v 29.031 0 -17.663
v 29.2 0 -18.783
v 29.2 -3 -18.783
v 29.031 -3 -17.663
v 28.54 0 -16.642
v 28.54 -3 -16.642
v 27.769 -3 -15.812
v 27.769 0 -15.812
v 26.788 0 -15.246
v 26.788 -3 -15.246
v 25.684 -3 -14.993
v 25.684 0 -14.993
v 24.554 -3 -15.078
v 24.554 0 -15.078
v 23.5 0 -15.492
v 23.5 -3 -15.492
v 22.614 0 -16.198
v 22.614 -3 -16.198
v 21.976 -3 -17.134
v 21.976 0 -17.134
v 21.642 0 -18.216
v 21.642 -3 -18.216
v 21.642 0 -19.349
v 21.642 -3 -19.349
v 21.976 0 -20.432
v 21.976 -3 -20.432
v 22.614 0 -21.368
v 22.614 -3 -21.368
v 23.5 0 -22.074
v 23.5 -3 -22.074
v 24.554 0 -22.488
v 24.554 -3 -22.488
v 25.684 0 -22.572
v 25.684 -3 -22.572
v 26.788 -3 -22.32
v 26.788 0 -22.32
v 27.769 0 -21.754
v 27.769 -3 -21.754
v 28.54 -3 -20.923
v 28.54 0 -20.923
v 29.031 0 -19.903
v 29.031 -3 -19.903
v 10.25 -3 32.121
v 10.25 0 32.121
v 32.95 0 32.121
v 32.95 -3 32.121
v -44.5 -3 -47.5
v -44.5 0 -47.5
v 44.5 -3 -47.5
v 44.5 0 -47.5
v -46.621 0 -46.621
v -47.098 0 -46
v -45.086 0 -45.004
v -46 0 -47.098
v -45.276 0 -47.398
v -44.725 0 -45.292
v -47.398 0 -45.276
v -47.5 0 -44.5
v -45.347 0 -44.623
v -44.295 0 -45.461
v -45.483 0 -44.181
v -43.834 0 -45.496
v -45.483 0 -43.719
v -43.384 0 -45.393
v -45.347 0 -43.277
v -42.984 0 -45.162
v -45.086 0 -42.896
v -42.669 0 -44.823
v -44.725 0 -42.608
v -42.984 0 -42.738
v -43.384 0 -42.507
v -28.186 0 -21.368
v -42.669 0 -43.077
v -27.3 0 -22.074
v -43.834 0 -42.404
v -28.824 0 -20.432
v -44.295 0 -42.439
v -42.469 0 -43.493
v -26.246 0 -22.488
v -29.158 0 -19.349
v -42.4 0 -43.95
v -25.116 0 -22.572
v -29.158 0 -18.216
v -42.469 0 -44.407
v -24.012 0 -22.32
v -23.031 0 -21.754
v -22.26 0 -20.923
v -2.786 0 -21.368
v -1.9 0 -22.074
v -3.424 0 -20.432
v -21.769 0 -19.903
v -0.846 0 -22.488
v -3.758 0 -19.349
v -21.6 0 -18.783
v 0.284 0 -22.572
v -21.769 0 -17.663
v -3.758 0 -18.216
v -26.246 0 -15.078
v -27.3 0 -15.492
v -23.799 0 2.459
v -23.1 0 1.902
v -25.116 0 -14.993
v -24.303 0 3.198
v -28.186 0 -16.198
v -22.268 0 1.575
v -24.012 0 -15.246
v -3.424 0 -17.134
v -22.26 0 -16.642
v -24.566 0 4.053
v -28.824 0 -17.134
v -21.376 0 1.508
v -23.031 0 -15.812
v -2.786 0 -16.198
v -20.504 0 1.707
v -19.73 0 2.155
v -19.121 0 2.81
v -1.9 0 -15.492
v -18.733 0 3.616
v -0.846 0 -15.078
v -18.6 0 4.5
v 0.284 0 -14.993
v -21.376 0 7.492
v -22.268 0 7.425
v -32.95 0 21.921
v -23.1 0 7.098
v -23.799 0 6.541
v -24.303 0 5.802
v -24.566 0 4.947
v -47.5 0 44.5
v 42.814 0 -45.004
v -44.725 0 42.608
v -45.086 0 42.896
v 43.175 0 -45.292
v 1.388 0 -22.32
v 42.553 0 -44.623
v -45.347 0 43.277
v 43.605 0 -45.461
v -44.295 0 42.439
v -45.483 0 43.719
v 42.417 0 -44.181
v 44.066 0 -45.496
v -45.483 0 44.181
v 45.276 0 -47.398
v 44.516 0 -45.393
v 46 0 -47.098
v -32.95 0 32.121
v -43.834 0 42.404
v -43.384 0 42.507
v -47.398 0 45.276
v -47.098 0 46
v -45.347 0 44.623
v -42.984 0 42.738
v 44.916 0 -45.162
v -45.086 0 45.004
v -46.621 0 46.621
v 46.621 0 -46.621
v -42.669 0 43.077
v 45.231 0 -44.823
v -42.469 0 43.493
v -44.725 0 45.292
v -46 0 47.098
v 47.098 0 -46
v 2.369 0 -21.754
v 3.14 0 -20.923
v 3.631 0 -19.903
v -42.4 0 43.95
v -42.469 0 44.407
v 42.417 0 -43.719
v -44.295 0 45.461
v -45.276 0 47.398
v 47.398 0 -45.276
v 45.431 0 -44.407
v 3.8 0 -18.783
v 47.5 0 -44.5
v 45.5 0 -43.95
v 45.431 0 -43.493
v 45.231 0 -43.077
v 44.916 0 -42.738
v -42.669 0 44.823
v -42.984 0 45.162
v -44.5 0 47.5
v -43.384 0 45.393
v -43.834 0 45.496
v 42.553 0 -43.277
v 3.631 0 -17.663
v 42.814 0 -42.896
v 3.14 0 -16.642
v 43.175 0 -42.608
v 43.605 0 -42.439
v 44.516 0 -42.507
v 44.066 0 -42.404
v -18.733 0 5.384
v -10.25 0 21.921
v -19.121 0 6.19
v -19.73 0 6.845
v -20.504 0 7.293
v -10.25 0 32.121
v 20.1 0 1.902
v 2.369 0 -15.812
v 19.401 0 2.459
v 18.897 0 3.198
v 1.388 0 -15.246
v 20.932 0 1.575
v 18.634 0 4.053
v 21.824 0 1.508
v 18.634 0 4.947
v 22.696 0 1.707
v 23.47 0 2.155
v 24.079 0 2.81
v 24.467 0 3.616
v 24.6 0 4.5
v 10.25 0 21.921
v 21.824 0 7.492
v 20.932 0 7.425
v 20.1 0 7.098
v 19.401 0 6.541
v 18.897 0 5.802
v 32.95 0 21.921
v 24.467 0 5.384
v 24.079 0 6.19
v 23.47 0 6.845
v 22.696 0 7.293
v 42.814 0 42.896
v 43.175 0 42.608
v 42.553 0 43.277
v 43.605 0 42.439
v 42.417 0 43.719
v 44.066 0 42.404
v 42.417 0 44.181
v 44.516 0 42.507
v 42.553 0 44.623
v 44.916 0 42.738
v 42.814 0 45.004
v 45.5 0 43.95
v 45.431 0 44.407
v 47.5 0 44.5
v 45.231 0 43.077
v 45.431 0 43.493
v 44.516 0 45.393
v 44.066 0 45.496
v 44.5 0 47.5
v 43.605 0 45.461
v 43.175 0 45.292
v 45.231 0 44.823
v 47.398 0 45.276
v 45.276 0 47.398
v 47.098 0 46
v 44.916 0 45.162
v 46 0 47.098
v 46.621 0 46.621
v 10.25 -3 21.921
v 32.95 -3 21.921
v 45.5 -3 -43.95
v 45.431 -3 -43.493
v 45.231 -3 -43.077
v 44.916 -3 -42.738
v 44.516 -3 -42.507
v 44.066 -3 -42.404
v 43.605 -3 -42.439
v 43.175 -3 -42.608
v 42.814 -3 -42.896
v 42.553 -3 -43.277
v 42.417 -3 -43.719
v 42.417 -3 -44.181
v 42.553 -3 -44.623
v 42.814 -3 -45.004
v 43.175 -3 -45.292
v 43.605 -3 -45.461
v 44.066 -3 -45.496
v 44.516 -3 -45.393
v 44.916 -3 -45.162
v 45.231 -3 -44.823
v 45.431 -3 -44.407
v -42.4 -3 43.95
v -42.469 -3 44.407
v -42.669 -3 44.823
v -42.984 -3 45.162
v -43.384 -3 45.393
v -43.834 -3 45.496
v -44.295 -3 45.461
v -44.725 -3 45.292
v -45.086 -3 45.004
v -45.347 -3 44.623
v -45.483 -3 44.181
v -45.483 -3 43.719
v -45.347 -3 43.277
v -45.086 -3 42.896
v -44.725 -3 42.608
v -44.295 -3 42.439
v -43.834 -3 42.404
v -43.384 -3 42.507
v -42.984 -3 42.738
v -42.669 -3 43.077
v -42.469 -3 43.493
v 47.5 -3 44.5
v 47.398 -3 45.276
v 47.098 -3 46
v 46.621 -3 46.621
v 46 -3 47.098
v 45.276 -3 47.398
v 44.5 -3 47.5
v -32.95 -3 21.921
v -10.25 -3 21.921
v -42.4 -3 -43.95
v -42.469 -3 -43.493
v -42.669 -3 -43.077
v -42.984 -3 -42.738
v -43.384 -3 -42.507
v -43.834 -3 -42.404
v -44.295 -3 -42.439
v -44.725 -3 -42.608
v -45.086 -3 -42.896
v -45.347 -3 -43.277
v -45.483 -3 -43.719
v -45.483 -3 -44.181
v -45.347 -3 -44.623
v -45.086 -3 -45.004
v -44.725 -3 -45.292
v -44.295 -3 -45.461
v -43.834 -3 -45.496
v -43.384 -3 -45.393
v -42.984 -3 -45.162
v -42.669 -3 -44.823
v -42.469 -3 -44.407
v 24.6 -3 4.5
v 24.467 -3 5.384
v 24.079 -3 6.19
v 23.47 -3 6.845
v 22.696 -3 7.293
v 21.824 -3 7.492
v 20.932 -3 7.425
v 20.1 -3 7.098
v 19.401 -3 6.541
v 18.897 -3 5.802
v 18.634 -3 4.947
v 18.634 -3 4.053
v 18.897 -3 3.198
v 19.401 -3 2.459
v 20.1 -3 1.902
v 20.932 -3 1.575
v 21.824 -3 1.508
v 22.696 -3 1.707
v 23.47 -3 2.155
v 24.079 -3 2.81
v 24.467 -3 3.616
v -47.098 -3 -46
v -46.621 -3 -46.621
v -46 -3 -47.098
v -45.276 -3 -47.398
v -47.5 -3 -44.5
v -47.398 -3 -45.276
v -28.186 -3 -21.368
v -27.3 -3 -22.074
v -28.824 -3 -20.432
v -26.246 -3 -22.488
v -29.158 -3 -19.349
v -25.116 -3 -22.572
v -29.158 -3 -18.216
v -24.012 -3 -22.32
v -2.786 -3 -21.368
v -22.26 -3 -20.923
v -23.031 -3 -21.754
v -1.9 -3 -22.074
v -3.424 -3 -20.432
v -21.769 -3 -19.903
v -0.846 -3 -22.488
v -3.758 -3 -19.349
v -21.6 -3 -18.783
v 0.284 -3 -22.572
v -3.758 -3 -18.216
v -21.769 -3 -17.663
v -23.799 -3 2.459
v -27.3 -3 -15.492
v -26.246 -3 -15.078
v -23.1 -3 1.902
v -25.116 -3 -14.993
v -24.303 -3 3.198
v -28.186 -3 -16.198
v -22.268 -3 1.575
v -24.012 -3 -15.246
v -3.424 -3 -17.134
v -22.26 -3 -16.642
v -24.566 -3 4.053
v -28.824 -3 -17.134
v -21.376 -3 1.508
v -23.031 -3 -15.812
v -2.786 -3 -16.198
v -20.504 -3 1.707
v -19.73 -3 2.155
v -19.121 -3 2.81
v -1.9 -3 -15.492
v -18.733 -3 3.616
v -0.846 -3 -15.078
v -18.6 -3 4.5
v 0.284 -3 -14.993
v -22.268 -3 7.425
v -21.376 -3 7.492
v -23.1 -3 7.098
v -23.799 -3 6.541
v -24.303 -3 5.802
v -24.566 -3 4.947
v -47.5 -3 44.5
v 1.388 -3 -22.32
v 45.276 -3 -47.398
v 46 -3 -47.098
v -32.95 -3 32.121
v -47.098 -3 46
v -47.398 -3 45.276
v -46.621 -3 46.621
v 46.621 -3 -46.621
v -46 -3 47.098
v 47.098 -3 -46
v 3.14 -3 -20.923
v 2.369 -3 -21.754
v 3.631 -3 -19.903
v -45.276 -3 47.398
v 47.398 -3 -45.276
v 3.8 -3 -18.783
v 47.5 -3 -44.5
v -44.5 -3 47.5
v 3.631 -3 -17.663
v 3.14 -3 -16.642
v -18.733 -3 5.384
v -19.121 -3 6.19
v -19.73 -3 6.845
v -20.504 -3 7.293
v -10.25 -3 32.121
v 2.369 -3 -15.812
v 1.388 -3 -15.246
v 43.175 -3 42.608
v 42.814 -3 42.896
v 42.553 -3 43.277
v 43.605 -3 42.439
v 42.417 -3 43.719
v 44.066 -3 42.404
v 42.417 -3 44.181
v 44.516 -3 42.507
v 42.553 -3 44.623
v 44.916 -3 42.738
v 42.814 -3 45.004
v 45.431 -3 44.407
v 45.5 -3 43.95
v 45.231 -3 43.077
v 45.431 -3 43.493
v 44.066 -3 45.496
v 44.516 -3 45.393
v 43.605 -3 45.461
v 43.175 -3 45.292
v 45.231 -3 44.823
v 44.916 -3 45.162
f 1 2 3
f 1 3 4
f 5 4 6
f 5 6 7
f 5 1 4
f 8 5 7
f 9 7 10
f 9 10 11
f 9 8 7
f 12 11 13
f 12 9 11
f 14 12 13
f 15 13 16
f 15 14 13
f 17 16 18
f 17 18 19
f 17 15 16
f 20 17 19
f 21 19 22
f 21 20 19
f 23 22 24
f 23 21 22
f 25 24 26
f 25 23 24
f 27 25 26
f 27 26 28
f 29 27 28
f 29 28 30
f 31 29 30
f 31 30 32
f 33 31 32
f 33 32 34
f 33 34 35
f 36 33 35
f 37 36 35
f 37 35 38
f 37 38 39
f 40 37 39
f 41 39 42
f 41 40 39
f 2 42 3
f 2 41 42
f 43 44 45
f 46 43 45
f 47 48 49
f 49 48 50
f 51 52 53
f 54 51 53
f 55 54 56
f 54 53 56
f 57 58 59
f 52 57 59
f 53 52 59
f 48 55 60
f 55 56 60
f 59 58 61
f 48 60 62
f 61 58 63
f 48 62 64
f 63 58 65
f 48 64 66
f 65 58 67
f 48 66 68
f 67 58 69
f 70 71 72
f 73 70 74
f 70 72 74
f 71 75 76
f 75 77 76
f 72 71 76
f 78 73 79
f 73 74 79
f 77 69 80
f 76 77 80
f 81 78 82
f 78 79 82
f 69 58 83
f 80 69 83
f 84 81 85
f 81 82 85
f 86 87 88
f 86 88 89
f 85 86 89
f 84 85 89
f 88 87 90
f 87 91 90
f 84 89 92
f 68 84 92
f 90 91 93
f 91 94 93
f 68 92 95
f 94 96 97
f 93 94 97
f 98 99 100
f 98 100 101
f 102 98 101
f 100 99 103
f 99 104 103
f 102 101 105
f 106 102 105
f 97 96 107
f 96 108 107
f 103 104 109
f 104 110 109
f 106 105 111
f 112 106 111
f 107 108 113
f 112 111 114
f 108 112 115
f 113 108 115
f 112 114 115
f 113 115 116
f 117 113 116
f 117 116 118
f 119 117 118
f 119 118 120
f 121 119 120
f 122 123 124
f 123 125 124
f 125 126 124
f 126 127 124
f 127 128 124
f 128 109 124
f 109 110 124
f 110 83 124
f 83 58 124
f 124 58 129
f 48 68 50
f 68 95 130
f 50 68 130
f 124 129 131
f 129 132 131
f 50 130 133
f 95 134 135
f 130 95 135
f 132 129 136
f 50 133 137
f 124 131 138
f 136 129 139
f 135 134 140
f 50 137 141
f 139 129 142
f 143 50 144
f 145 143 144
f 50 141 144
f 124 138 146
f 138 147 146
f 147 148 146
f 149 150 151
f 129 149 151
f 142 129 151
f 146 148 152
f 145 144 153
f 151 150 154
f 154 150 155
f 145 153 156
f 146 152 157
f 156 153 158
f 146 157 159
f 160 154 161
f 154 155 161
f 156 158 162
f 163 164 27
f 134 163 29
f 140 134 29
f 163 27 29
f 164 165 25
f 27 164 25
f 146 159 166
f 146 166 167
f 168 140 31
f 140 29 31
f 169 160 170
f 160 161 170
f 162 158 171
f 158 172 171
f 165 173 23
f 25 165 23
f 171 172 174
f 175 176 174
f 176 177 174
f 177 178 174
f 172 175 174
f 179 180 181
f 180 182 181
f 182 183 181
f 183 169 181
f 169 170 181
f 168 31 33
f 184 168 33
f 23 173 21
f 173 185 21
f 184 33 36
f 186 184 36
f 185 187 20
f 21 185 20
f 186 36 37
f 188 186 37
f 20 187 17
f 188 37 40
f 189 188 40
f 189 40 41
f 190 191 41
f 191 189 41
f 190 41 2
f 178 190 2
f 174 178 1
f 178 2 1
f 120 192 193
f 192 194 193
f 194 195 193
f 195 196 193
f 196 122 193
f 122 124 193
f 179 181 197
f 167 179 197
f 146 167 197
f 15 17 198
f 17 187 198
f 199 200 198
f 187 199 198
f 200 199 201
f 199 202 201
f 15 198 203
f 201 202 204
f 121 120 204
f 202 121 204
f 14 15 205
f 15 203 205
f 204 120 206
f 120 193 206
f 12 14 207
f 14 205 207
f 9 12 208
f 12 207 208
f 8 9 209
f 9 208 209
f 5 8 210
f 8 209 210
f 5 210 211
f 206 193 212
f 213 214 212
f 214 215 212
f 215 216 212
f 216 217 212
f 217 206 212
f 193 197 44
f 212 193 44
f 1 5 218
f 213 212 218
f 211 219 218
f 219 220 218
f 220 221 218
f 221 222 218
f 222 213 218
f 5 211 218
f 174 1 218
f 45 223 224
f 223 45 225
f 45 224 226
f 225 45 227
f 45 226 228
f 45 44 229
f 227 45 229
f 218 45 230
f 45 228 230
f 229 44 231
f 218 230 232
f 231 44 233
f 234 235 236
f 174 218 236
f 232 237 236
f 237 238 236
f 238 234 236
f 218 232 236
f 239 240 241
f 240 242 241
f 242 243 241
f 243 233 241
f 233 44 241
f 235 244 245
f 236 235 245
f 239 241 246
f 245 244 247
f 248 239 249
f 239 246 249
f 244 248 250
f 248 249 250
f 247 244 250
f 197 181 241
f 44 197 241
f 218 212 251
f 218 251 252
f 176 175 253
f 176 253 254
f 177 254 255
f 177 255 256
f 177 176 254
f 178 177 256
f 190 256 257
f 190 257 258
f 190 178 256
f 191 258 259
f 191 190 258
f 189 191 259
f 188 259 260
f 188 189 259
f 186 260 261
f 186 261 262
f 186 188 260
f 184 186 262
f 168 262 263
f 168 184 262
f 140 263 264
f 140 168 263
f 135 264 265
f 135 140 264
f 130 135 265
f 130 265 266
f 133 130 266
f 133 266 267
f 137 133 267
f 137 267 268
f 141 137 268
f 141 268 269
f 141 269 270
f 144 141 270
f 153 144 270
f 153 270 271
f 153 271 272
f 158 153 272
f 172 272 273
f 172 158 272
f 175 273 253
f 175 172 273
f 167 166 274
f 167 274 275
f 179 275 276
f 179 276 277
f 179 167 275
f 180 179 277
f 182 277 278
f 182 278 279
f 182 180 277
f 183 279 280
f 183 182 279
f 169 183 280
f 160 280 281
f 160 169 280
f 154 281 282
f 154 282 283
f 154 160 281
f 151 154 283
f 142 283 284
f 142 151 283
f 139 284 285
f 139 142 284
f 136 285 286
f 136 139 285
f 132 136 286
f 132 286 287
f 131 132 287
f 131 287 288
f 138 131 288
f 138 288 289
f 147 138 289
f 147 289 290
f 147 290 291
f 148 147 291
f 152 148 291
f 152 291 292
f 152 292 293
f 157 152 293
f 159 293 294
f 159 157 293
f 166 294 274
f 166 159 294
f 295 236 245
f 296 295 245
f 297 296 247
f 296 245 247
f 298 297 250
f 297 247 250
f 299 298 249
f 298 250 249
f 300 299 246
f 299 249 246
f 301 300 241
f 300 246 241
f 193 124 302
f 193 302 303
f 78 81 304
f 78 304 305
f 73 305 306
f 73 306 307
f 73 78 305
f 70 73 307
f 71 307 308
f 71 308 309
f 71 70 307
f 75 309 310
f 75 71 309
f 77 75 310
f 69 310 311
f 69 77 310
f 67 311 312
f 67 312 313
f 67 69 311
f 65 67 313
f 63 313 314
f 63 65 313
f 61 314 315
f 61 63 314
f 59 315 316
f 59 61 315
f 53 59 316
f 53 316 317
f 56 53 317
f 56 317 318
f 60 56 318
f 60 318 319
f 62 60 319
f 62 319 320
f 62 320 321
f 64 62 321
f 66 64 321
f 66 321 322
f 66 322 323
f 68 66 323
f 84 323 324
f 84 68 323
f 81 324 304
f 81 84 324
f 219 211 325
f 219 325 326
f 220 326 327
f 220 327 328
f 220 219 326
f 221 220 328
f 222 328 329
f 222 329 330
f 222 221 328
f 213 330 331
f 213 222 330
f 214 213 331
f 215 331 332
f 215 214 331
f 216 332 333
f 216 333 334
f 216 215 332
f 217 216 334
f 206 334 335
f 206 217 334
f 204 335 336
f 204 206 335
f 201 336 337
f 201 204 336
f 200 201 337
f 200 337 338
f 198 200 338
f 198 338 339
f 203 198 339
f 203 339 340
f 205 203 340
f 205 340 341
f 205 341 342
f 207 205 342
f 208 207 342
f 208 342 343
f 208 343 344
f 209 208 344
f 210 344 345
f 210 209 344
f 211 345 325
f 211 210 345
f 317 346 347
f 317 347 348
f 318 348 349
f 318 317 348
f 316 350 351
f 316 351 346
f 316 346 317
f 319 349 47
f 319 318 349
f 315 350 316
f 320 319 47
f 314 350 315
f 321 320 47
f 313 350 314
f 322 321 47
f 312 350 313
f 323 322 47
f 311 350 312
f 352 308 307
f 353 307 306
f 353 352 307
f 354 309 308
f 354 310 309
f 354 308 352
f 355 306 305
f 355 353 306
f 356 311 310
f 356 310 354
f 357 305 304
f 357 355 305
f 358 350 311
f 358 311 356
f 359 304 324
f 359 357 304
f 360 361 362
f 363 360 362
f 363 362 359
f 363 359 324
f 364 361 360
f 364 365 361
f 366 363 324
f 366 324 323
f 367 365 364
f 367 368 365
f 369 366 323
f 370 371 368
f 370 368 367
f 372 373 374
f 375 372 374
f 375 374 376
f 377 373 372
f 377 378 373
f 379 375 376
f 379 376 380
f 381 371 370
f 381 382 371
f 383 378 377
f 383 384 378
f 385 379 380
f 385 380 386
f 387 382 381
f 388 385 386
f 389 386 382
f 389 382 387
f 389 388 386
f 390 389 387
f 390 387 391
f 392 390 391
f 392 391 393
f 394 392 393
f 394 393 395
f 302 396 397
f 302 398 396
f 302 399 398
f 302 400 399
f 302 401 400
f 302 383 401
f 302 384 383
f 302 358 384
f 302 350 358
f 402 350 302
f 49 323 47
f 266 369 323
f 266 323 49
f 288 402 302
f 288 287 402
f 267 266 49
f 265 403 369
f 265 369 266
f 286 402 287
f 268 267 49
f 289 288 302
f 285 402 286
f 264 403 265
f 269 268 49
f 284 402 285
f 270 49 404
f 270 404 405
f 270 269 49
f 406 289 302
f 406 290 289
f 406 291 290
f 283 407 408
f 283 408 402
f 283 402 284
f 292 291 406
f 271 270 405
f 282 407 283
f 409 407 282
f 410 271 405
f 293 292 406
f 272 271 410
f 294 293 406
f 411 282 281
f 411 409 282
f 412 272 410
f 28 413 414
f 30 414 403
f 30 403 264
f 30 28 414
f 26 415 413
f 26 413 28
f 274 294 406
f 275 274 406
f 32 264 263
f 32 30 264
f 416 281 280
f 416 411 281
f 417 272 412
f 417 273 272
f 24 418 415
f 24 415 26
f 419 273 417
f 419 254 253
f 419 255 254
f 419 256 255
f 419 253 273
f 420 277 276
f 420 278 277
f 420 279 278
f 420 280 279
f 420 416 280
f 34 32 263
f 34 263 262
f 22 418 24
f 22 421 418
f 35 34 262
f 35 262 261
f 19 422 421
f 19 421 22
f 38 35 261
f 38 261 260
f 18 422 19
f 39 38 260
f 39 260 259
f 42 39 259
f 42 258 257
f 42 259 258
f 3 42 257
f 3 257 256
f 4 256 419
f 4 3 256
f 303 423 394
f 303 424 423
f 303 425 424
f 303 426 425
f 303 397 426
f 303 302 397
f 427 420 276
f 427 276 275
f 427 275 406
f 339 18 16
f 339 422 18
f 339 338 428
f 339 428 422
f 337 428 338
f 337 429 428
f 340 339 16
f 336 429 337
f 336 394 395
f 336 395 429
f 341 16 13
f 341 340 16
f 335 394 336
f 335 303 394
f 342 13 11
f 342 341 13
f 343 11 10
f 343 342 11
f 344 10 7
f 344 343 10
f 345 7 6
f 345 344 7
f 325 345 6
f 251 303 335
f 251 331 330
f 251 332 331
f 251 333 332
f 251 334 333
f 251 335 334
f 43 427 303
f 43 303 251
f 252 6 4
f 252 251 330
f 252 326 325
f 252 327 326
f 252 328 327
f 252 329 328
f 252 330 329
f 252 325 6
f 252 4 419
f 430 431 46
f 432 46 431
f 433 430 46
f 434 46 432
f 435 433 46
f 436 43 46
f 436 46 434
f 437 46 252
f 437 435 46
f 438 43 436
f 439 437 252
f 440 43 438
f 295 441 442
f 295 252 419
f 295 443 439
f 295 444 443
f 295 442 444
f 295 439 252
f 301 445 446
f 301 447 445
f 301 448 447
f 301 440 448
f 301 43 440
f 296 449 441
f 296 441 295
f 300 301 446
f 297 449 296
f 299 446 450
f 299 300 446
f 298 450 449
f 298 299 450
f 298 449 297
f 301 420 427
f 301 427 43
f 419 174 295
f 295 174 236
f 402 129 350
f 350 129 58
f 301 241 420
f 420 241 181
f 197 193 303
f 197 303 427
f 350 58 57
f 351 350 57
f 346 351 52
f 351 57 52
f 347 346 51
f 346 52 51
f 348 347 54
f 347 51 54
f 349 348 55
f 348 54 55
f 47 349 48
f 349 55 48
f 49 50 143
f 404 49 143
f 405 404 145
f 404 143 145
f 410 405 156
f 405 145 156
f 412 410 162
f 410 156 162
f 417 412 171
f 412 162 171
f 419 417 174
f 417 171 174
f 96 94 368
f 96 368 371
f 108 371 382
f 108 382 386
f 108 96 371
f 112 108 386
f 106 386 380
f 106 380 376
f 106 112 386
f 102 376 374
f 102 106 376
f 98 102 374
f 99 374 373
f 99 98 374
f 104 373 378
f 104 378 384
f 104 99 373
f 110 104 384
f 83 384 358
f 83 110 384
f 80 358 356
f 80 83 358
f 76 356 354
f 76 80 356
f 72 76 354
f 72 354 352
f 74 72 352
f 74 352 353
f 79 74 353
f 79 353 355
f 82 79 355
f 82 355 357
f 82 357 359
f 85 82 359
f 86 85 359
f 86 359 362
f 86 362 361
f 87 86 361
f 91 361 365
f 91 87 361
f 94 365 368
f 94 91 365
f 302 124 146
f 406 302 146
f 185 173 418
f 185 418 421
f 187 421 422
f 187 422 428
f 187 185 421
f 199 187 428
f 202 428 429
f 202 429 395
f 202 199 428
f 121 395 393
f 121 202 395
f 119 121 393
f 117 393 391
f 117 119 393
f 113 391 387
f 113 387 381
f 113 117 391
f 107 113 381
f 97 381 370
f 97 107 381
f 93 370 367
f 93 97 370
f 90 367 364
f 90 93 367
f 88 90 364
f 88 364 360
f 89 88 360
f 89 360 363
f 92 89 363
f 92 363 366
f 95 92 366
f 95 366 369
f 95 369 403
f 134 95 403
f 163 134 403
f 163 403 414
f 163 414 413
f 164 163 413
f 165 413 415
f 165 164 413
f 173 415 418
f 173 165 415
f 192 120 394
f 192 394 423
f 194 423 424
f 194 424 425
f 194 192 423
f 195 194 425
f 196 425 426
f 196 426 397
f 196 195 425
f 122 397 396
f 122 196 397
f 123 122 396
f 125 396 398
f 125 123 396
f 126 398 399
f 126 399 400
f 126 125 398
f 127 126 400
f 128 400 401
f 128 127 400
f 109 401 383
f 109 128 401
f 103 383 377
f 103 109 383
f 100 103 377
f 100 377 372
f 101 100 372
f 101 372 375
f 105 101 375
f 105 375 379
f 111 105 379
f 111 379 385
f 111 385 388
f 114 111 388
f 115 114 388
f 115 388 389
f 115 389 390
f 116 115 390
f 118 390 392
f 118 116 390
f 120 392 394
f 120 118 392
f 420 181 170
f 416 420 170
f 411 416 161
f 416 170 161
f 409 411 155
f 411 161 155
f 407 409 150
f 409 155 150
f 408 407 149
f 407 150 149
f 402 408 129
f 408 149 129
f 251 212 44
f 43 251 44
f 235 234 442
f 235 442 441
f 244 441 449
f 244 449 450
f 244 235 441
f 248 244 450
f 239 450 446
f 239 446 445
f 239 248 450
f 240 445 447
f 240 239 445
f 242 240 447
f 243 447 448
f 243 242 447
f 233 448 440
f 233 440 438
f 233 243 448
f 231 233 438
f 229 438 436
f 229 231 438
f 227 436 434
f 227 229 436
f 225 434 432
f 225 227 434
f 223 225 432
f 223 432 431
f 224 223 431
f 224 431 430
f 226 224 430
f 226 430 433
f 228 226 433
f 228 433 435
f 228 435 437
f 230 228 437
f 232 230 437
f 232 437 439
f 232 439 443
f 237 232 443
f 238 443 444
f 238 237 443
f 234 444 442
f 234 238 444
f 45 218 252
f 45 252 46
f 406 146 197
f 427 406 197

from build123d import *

# Parameters (mm, degrees)
F0_R     = 1.55
F0_R_2   = 3.8
F0_R_3   = 3
F0_W     = 22.7
F0_H     = 10.2
F1_DEPTH = 3


with BuildPart() as f1:
    # F0 (on Front) → F1 (new body)
    with BuildSketch(Plane.XZ):
        with BuildLine():
            Line((-44.5, -47.5), (44.5, -47.5))
            ThreePointArc((44.5, -47.5), (46.62132, -46.62132), (47.5, -44.5))
            Line((47.5, -44.5), (47.5, 44.5))
            ThreePointArc((47.5, 44.5), (46.62132, 46.62132), (44.5, 47.5))
            Line((44.5, 47.5), (-44.5, 47.5))
            ThreePointArc((-44.5, 47.5), (-46.62132, 46.62132), (-47.5, 44.5))
            Line((-47.5, 44.5), (-47.5, -44.5))
            ThreePointArc((-47.5, -44.5), (-46.62132, -46.62132), (-44.5, -47.5))
        make_face()
        with Locations((-43.95, -43.95)):
            Circle(F0_R, mode=Mode.SUBTRACT)
        with Locations((-25.4, -18.782858)):
            Circle(F0_R_2, mode=Mode.SUBTRACT)
        with Locations((43.95, -43.95)):
            Circle(F0_R, mode=Mode.SUBTRACT)
        with Locations((0, -18.782858)):
            Circle(F0_R_2, mode=Mode.SUBTRACT)
        with Locations((25.4, -18.782858)):
            Circle(F0_R_2, mode=Mode.SUBTRACT)
        with Locations((-21.6, 4.5)):
            Circle(F0_R_3, mode=Mode.SUBTRACT)
        with Locations((-43.95, 43.95)):
            Circle(F0_R, mode=Mode.SUBTRACT)
        with Locations((-21.6, 27.020905)):
            Rectangle(F0_W, F0_H, mode=Mode.SUBTRACT)
        with Locations((21.6, 4.5)):
            Circle(F0_R_3, mode=Mode.SUBTRACT)
        with Locations((21.6, 27.020905)):
            Rectangle(F0_W, F0_H, mode=Mode.SUBTRACT)
        with Locations((43.95, 43.95)):
            Circle(F0_R, mode=Mode.SUBTRACT)
    extrude(amount=F1_DEPTH)


solid = f1.part
